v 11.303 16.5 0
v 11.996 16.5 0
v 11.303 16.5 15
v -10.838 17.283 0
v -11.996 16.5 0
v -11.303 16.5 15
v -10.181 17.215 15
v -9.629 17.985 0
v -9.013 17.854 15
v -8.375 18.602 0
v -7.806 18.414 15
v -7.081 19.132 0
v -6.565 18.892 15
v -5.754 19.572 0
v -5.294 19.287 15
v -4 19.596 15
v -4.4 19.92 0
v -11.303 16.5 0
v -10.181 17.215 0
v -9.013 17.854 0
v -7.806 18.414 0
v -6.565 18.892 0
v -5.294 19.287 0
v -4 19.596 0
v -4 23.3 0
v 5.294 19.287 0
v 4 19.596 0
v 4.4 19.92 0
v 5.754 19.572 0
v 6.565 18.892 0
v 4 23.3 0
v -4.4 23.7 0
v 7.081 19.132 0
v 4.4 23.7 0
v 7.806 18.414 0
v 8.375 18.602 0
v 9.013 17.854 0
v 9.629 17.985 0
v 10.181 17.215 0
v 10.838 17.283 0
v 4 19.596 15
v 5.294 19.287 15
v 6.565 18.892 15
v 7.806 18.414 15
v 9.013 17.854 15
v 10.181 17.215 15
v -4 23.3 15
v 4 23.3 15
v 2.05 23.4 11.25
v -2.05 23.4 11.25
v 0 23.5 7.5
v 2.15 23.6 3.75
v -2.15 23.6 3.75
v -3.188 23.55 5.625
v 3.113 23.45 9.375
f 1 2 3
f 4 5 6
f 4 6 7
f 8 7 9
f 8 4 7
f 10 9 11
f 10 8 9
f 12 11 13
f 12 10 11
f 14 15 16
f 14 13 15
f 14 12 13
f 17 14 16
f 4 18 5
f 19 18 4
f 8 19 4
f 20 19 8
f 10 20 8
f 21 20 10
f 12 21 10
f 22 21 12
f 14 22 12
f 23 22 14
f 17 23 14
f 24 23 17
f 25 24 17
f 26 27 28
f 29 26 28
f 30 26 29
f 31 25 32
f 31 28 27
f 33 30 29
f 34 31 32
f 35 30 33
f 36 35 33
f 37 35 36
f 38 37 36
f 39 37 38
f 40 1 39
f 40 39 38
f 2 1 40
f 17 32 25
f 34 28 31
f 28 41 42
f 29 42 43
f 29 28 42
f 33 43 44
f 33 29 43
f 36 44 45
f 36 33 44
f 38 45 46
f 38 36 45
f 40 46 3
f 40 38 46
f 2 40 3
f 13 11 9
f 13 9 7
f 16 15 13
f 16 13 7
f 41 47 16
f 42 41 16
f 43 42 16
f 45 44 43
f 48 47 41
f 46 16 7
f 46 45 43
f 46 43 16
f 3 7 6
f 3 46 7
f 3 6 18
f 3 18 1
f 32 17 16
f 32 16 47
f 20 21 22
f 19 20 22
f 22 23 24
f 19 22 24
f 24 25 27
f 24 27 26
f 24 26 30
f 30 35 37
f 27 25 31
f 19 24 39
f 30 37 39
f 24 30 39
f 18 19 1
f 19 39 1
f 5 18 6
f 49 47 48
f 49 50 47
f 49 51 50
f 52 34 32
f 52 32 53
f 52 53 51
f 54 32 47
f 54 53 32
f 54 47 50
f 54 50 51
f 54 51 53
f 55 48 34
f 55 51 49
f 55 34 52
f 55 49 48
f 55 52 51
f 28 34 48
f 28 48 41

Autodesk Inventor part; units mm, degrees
ref_plane "YZ Plane" through (0, 0, 0) normal (1, 0, 0) x (0, 1, 0)
ref_plane "XZ Plane" through (0, 0, 0) normal (0, 1, 0) x (-1, 0, 0)
ref_plane "XY Plane" through (0, 0, 0) normal (0, 0, 1) x (1, 0, 0)
sketch "Skizze1" plane through (0, 0, 0) normal (0, 0, 1) x (1, 0, 0)
  line L0 (-4, 23.3) -> (4, 23.3)
  line L1 (4, 23.3) -> (4, 20)
  line L2 (-4, 20) -> (-4, 23.3)
  line L3 (-4, 23.3) -> (4, 20) construction
  line L4 (4, 23.3) -> (-4, 20) construction
  line L5 (0, 152) -> (0, -72) projected
  line L6 (4, 20) -> (4, 19.5959)
  line L7 (-4, 20) -> (-4, 19.5959)
  arc A0 (-4, 19.5959) -> (4, 19.5959) centre (0, 0) ccw
  line L8 (-168, 0) -> (168, 0) projected
  line L9 (-35, 0) -> (-105, 0) construction
  line L10 (-35, -3) -> (-105, -3)
  line L11 (-105, 3) -> (-35, 3)
  arc A1 (-35, -3) -> (-35, 3) centre (-35, 0) ccw
  arc A2 (-105, 3) -> (-105, -3) centre (-105, 0) ccw
  arc A3 (-38.9589, -9.0666) -> (38.9589, -9.0666) centre (0, 0) ccw
  line L12 (-38.9589, -9.0666) -> (-119.657, -9.0666)
  line L13 (38.9589, -9.0666) -> (119.657, -9.0666)
  arc A4 (119.657, -9.0666) -> (-119.657, -9.0666) centre (0, 0) ccw
  arc A5 (-33.4838, 10.6223) -> (-31.1877, 16.1656) centre (-32.3358, 13.3939) ccw
  line L14 (-95.8593, 42.9534) -> (-31.1877, 16.1656)
  line L15 (-32.3358, 13.3939) -> (-97.0074, 40.1818) construction
  arc A6 (-95.8593, 42.9534) -> (-98.1554, 37.4101) centre (-97.0074, 40.1818) ccw
  line L16 (-33.4838, 10.6223) -> (-98.1554, 37.4101)
  arc A7 (-26.8701, 22.6274) -> (-22.6274, 26.8701) centre (-24.7487, 24.7487) ccw
  line L17 (-72.1249, 76.3675) -> (-22.6274, 26.8701)
  line L18 (-24.7487, 24.7487) -> (-74.2462, 74.2462) construction
  arc A8 (-72.1249, 76.3675) -> (-76.3675, 72.1249) centre (-74.2462, 74.2462) ccw
  line L19 (-26.8701, 22.6274) -> (-76.3675, 72.1249)
  arc A9 (-16.1656, 31.1877) -> (-10.6223, 33.4838) centre (-13.3939, 32.3358) ccw
  line L20 (-37.4101, 98.1554) -> (-10.6223, 33.4838)
  line L21 (-13.3939, 32.3358) -> (-40.1818, 97.0074) construction
  arc A10 (-37.4101, 98.1554) -> (-42.9534, 95.8593) centre (-40.1818, 97.0074) ccw
  line L22 (-16.1656, 31.1877) -> (-42.9534, 95.8593)
  arc A11 (-3, 35) -> (3, 35) centre (0, 35) ccw
  line L23 (3, 105) -> (3, 35)
  line L24 (0, 35) -> (0, 105) construction
  arc A12 (3, 105) -> (-3, 105) centre (0, 105) ccw
  line L25 (-3, 35) -> (-3, 105)
  arc A13 (10.6223, 33.4838) -> (16.1656, 31.1877) centre (13.3939, 32.3358) ccw
  line L26 (42.9534, 95.8593) -> (16.1656, 31.1877)
  line L27 (13.3939, 32.3358) -> (40.1818, 97.0074) construction
  arc A14 (42.9534, 95.8593) -> (37.4101, 98.1554) centre (40.1818, 97.0074) ccw
  line L28 (10.6223, 33.4838) -> (37.4101, 98.1554)
  arc A15 (22.6274, 26.8701) -> (26.8701, 22.6274) centre (24.7487, 24.7487) ccw
  line L29 (76.3675, 72.1249) -> (26.8701, 22.6274)
  line L30 (24.7487, 24.7487) -> (74.2462, 74.2462) construction
  arc A16 (76.3675, 72.1249) -> (72.1249, 76.3675) centre (74.2462, 74.2462) ccw
  line L31 (22.6274, 26.8701) -> (72.1249, 76.3675)
  arc A17 (31.1877, 16.1656) -> (33.4838, 10.6223) centre (32.3358, 13.3939) ccw
  line L32 (98.1554, 37.4101) -> (33.4838, 10.6223)
  line L33 (32.3358, 13.3939) -> (97.0074, 40.1818) construction
  arc A18 (98.1554, 37.4101) -> (95.8593, 42.9534) centre (97.0074, 40.1818) ccw
  line L34 (31.1877, 16.1656) -> (95.8593, 42.9534)
  arc A19 (35, 3) -> (35, -3) centre (35, 0) ccw
  line L35 (105, -3) -> (35, -3)
  line L36 (35, 0) -> (105, 0) construction
  arc A20 (105, -3) -> (105, 3) centre (105, 0) ccw
  line L37 (35, 3) -> (105, 3)
  line L38 (-55.3007, 11) -> (-101.4947, 30.1342)
  line L39 (-101.4947, 30.1342) -> (-105.3007, 11)
  line L40 (-105.3007, 11) -> (-55.3007, 11)
  line L41 (-82.1538, 66.7832) -> (-93.0127, 50.5755)
  line L42 (-46.8426, 31.3838) -> (-82.1538, 66.7832)
  line L43 (-93.0127, 50.5755) -> (-46.8426, 31.3838)
  line L44 (-50.2273, 93.2012) -> (-66.4754, 82.403)
  line L45 (-31.2084, 46.9597) -> (-50.2273, 93.2012)
  line L46 (-66.4754, 82.403) -> (-31.2084, 46.9597)
  line L47 (-10.6061, 105.3411) -> (-29.7544, 101.6067)
  line L48 (-10.7931, 55.3415) -> (-10.6061, 105.3411)
  line L49 (-29.7544, 101.6067) -> (-10.7931, 55.3415)
  line L50 (30.6399, 101.3432) -> (11.525, 105.2446)
  line L51 (11.2756, 55.2452) -> (30.6399, 101.3432)
  line L52 (11.525, 105.2446) -> (11.2756, 55.2452)
  line L53 (67.192, 81.8198) -> (51.0387, 92.7593)
  line L54 (31.617, 46.6855) -> (67.192, 81.8198)
  line L55 (51.0387, 92.7593) -> (31.617, 46.6855)
  line L56 (93.4505, 49.7619) -> (82.7335, 66.0637)
  line L57 (47.1147, 30.9738) -> (93.4505, 49.7619)
  line L58 (82.7335, 66.0637) -> (47.1147, 30.9738)
  line L59 (105.3927, 10.0807) -> (101.7538, 29.2473)
  line L60 (55.3946, 10.517) -> (105.3927, 10.0807)
  line L61 (101.7538, 29.2473) -> (55.3946, 10.517)
  point P0 (0, 21.65)
  point P1 (-70, 0)
  point P2 (-64.6716, 26.7878)
  point P3 (-49.4975, 49.4975)
  point P4 (-26.7878, 64.6716)
  point P5 (0, 70)
  point P6 (26.7878, 64.6716)
  point P7 (49.4975, 49.4975)
  point P8 (64.6716, 26.7878)
  point P9 (70, 0)
  dimension "d2" = 8
  dimension "d3" = 0
  dimension "d4" = 3.3
  dimension "d7" = 70
  dimension "d8" = 3
  dimension "d9" = 70
  dimension "d12" = 180
  dimension "d18" = 120
  dimension "d19" = 40
  dimension "d21" = 8
  dimension "d22" = 8
  dimension "d23" = 50
  dimension "d24" = 50
  dimension "d27" = 158
extrude "Extrusion1" add sketch "Skizze1" along normal blind 15 contours L2 L7 A0 L8 A1 L11 A2 A4 L5 A12 L25 A11 L0 | L5 A11 L23 A12 A4 L8 A20 L37 A19 A0 L6 L1 L0 | A0 L8 A19 L35 A20 A4 L13 A3 L5 | L5 A3 L12 A4 L8 A2 L10 A1 A0
fillet "Rundung1" radius 15 2 edges at (-38.9589, -9.0666, 7.5) (38.9589, -9.0666, 7.5)
fillet "Rundung2" radius 5 2 edges at (119.657, -9.0666, 7.5) (-119.657, -9.0666, 7.5)
sketch "Skizze2" plane through (49.455, -9.0666, 0) normal (0, -1, 0) x (1, 0, 0)
  circle A0 centre (62.4699, 2.5) radius 1
  line L0 (0, 0) -> (65.4731, 0) projected
  circle A1 centre (-161.38, 12.5) radius 1
  line L1 (-164.3831, 15) -> (-98.91, 15) projected
  line L2 (-169.38, 15) -> (-169.38, 0) projected
  line L3 (70.4699, 0) -> (70.4699, 15) projected
  point P0 (-49.455, 0)
  dimension "d29" = 2.5
  dimension "d30" = 2
  dimension "d31" = 2.5
  dimension "d32" = 2
  dimension "d33" = 8
  dimension "d34" = 8
extrude "Extrusion2" cut sketch "Skizze2" against normal blind 15
fillet "Rundung3" radius 2 16 edges at (-101.4947, 30.1342, 7.5) (-105.3007, 11, 7.5) (-93.0127, 50.5755, 7.5) (-66.4754, 82.403, 7.5) (-10.6061, 105.3411, 7.5) (-50.2273, 93.2012, 7.5) (-82.1538, 66.7832, 7.5) (-29.7544, 101.6067, 7.5) (30.6399, 101.3432, 7.5) (11.525, 105.2446, 7.5) (67.192, 81.8198, 7.5) (51.0387, 92.7593, 7.5) (93.4505, 49.7619, 7.5) (82.7335, 66.0637, 7.5) (101.7538, 29.2473, 7.5) (105.3927, 10.0807, 7.5)
sketch "Skizze3" plane through (0, 0, 15) normal (0, 0, 1) x (1, 0, 0)
  point P0 (0, 0)
sketch "Skizze4" plane through (0, 0, 15) normal (0, 0, 1) x (1, 0, 0)
  arc A0 (-4, 19.5959) -> (4, 19.5959) centre (0, 0) ccw projected
  line L0 (-4, 19.5959) -> (-4, 23.3) projected
  line L1 (-4, 23.3) -> (4, 23.3) projected
  line L2 (4, 23.3) -> (4, 19.5959) projected
  line L3 (-11.3027, 16.5) -> (11.3027, 16.5)
  circle A1 centre (0, 0) radius 20 construction
  line L4 (0, 20) -> (0, 0) construction
  dimension "d38" = 3.5
extrude "Extrusion3" add sketch "Skizze4" against normal up to surface (15 mm away) separate body contours L0 L1 L2 A0 L3
delete faces "Fläche löschen1" heal no whole lump yes faces at (104.9716, 12.1826, 5)
sketch "Skizze5" plane through (11.3027, 16.5, 0) normal (0, 0, -1) x (-1, 0, 0)
  line L0 (15.3027, 3.0959) -> (15.3027, 6.8) construction
  line L1 (15.3027, 6.8) -> (7.3027, 6.8) construction
  line L2 (7.3027, 6.8) -> (7.3027, 3.0959) construction
  arc A0 (7.3027, 3.0959) -> (0, 0) centre (11.3027, -16.5) ccw construction
  line L3 (0, 0) -> (22.6053, 0) construction
  arc A1 (22.6053, 0) -> (15.3027, 3.0959) centre (11.3027, -16.5) ccw construction
  line L4 (6.9027, 7.2) -> (15.7027, 7.2)
  line L5 (15.7027, 7.2) -> (15.7027, 3.4198)
  arc A2 (23.2989, 0) -> (15.7027, 3.4198) centre (11.3027, -16.5) ccw
  arc A3 (6.9027, 3.4198) -> (-0.6936, 0) centre (11.3027, -16.5) ccw
  line L6 (6.9027, 3.4198) -> (6.9027, 7.2)
  line L7 (-0.6936, 0) -> (23.2989, 0)
  dimension "d41" = 0.4
  dimension "d42" = 0.4
  dimension "d43" = 0.4
  dimension "d44" = 0.4
sketch "Skizze6" plane through (0, 0, 15) normal (0, 0, 1) x (1, 0, 0)
  line L0 (4, 23.3) -> (-4, 23.3) projected
  line L1 (-4, 23.3) -> (-4, 19.5959) projected
  arc A0 (-4, 19.5959) -> (-11.3027, 16.5) centre (0, 0) ccw projected
  line L2 (-11.3027, 16.5) -> (11.3027, 16.5) projected
  arc A1 (11.3027, 16.5) -> (4, 19.5959) centre (0, 0) ccw projected
  line L3 (4, 19.5959) -> (4, 23.3) projected
loft "Erhebung1" add profiles "Skizze5" bodies 2 section 1 edges at (0, 23.3, 15) (-4, 21.448, 15) (-7.8063, 18.4136, 15) (0, 16.5, 15) (7.8063, 18.4136, 15) (4, 21.448, 15)
equation "\"d42\" = d41"
equation "\"d43\" = d42"
properties part number "Capstonradialdisc_Aufmass"
